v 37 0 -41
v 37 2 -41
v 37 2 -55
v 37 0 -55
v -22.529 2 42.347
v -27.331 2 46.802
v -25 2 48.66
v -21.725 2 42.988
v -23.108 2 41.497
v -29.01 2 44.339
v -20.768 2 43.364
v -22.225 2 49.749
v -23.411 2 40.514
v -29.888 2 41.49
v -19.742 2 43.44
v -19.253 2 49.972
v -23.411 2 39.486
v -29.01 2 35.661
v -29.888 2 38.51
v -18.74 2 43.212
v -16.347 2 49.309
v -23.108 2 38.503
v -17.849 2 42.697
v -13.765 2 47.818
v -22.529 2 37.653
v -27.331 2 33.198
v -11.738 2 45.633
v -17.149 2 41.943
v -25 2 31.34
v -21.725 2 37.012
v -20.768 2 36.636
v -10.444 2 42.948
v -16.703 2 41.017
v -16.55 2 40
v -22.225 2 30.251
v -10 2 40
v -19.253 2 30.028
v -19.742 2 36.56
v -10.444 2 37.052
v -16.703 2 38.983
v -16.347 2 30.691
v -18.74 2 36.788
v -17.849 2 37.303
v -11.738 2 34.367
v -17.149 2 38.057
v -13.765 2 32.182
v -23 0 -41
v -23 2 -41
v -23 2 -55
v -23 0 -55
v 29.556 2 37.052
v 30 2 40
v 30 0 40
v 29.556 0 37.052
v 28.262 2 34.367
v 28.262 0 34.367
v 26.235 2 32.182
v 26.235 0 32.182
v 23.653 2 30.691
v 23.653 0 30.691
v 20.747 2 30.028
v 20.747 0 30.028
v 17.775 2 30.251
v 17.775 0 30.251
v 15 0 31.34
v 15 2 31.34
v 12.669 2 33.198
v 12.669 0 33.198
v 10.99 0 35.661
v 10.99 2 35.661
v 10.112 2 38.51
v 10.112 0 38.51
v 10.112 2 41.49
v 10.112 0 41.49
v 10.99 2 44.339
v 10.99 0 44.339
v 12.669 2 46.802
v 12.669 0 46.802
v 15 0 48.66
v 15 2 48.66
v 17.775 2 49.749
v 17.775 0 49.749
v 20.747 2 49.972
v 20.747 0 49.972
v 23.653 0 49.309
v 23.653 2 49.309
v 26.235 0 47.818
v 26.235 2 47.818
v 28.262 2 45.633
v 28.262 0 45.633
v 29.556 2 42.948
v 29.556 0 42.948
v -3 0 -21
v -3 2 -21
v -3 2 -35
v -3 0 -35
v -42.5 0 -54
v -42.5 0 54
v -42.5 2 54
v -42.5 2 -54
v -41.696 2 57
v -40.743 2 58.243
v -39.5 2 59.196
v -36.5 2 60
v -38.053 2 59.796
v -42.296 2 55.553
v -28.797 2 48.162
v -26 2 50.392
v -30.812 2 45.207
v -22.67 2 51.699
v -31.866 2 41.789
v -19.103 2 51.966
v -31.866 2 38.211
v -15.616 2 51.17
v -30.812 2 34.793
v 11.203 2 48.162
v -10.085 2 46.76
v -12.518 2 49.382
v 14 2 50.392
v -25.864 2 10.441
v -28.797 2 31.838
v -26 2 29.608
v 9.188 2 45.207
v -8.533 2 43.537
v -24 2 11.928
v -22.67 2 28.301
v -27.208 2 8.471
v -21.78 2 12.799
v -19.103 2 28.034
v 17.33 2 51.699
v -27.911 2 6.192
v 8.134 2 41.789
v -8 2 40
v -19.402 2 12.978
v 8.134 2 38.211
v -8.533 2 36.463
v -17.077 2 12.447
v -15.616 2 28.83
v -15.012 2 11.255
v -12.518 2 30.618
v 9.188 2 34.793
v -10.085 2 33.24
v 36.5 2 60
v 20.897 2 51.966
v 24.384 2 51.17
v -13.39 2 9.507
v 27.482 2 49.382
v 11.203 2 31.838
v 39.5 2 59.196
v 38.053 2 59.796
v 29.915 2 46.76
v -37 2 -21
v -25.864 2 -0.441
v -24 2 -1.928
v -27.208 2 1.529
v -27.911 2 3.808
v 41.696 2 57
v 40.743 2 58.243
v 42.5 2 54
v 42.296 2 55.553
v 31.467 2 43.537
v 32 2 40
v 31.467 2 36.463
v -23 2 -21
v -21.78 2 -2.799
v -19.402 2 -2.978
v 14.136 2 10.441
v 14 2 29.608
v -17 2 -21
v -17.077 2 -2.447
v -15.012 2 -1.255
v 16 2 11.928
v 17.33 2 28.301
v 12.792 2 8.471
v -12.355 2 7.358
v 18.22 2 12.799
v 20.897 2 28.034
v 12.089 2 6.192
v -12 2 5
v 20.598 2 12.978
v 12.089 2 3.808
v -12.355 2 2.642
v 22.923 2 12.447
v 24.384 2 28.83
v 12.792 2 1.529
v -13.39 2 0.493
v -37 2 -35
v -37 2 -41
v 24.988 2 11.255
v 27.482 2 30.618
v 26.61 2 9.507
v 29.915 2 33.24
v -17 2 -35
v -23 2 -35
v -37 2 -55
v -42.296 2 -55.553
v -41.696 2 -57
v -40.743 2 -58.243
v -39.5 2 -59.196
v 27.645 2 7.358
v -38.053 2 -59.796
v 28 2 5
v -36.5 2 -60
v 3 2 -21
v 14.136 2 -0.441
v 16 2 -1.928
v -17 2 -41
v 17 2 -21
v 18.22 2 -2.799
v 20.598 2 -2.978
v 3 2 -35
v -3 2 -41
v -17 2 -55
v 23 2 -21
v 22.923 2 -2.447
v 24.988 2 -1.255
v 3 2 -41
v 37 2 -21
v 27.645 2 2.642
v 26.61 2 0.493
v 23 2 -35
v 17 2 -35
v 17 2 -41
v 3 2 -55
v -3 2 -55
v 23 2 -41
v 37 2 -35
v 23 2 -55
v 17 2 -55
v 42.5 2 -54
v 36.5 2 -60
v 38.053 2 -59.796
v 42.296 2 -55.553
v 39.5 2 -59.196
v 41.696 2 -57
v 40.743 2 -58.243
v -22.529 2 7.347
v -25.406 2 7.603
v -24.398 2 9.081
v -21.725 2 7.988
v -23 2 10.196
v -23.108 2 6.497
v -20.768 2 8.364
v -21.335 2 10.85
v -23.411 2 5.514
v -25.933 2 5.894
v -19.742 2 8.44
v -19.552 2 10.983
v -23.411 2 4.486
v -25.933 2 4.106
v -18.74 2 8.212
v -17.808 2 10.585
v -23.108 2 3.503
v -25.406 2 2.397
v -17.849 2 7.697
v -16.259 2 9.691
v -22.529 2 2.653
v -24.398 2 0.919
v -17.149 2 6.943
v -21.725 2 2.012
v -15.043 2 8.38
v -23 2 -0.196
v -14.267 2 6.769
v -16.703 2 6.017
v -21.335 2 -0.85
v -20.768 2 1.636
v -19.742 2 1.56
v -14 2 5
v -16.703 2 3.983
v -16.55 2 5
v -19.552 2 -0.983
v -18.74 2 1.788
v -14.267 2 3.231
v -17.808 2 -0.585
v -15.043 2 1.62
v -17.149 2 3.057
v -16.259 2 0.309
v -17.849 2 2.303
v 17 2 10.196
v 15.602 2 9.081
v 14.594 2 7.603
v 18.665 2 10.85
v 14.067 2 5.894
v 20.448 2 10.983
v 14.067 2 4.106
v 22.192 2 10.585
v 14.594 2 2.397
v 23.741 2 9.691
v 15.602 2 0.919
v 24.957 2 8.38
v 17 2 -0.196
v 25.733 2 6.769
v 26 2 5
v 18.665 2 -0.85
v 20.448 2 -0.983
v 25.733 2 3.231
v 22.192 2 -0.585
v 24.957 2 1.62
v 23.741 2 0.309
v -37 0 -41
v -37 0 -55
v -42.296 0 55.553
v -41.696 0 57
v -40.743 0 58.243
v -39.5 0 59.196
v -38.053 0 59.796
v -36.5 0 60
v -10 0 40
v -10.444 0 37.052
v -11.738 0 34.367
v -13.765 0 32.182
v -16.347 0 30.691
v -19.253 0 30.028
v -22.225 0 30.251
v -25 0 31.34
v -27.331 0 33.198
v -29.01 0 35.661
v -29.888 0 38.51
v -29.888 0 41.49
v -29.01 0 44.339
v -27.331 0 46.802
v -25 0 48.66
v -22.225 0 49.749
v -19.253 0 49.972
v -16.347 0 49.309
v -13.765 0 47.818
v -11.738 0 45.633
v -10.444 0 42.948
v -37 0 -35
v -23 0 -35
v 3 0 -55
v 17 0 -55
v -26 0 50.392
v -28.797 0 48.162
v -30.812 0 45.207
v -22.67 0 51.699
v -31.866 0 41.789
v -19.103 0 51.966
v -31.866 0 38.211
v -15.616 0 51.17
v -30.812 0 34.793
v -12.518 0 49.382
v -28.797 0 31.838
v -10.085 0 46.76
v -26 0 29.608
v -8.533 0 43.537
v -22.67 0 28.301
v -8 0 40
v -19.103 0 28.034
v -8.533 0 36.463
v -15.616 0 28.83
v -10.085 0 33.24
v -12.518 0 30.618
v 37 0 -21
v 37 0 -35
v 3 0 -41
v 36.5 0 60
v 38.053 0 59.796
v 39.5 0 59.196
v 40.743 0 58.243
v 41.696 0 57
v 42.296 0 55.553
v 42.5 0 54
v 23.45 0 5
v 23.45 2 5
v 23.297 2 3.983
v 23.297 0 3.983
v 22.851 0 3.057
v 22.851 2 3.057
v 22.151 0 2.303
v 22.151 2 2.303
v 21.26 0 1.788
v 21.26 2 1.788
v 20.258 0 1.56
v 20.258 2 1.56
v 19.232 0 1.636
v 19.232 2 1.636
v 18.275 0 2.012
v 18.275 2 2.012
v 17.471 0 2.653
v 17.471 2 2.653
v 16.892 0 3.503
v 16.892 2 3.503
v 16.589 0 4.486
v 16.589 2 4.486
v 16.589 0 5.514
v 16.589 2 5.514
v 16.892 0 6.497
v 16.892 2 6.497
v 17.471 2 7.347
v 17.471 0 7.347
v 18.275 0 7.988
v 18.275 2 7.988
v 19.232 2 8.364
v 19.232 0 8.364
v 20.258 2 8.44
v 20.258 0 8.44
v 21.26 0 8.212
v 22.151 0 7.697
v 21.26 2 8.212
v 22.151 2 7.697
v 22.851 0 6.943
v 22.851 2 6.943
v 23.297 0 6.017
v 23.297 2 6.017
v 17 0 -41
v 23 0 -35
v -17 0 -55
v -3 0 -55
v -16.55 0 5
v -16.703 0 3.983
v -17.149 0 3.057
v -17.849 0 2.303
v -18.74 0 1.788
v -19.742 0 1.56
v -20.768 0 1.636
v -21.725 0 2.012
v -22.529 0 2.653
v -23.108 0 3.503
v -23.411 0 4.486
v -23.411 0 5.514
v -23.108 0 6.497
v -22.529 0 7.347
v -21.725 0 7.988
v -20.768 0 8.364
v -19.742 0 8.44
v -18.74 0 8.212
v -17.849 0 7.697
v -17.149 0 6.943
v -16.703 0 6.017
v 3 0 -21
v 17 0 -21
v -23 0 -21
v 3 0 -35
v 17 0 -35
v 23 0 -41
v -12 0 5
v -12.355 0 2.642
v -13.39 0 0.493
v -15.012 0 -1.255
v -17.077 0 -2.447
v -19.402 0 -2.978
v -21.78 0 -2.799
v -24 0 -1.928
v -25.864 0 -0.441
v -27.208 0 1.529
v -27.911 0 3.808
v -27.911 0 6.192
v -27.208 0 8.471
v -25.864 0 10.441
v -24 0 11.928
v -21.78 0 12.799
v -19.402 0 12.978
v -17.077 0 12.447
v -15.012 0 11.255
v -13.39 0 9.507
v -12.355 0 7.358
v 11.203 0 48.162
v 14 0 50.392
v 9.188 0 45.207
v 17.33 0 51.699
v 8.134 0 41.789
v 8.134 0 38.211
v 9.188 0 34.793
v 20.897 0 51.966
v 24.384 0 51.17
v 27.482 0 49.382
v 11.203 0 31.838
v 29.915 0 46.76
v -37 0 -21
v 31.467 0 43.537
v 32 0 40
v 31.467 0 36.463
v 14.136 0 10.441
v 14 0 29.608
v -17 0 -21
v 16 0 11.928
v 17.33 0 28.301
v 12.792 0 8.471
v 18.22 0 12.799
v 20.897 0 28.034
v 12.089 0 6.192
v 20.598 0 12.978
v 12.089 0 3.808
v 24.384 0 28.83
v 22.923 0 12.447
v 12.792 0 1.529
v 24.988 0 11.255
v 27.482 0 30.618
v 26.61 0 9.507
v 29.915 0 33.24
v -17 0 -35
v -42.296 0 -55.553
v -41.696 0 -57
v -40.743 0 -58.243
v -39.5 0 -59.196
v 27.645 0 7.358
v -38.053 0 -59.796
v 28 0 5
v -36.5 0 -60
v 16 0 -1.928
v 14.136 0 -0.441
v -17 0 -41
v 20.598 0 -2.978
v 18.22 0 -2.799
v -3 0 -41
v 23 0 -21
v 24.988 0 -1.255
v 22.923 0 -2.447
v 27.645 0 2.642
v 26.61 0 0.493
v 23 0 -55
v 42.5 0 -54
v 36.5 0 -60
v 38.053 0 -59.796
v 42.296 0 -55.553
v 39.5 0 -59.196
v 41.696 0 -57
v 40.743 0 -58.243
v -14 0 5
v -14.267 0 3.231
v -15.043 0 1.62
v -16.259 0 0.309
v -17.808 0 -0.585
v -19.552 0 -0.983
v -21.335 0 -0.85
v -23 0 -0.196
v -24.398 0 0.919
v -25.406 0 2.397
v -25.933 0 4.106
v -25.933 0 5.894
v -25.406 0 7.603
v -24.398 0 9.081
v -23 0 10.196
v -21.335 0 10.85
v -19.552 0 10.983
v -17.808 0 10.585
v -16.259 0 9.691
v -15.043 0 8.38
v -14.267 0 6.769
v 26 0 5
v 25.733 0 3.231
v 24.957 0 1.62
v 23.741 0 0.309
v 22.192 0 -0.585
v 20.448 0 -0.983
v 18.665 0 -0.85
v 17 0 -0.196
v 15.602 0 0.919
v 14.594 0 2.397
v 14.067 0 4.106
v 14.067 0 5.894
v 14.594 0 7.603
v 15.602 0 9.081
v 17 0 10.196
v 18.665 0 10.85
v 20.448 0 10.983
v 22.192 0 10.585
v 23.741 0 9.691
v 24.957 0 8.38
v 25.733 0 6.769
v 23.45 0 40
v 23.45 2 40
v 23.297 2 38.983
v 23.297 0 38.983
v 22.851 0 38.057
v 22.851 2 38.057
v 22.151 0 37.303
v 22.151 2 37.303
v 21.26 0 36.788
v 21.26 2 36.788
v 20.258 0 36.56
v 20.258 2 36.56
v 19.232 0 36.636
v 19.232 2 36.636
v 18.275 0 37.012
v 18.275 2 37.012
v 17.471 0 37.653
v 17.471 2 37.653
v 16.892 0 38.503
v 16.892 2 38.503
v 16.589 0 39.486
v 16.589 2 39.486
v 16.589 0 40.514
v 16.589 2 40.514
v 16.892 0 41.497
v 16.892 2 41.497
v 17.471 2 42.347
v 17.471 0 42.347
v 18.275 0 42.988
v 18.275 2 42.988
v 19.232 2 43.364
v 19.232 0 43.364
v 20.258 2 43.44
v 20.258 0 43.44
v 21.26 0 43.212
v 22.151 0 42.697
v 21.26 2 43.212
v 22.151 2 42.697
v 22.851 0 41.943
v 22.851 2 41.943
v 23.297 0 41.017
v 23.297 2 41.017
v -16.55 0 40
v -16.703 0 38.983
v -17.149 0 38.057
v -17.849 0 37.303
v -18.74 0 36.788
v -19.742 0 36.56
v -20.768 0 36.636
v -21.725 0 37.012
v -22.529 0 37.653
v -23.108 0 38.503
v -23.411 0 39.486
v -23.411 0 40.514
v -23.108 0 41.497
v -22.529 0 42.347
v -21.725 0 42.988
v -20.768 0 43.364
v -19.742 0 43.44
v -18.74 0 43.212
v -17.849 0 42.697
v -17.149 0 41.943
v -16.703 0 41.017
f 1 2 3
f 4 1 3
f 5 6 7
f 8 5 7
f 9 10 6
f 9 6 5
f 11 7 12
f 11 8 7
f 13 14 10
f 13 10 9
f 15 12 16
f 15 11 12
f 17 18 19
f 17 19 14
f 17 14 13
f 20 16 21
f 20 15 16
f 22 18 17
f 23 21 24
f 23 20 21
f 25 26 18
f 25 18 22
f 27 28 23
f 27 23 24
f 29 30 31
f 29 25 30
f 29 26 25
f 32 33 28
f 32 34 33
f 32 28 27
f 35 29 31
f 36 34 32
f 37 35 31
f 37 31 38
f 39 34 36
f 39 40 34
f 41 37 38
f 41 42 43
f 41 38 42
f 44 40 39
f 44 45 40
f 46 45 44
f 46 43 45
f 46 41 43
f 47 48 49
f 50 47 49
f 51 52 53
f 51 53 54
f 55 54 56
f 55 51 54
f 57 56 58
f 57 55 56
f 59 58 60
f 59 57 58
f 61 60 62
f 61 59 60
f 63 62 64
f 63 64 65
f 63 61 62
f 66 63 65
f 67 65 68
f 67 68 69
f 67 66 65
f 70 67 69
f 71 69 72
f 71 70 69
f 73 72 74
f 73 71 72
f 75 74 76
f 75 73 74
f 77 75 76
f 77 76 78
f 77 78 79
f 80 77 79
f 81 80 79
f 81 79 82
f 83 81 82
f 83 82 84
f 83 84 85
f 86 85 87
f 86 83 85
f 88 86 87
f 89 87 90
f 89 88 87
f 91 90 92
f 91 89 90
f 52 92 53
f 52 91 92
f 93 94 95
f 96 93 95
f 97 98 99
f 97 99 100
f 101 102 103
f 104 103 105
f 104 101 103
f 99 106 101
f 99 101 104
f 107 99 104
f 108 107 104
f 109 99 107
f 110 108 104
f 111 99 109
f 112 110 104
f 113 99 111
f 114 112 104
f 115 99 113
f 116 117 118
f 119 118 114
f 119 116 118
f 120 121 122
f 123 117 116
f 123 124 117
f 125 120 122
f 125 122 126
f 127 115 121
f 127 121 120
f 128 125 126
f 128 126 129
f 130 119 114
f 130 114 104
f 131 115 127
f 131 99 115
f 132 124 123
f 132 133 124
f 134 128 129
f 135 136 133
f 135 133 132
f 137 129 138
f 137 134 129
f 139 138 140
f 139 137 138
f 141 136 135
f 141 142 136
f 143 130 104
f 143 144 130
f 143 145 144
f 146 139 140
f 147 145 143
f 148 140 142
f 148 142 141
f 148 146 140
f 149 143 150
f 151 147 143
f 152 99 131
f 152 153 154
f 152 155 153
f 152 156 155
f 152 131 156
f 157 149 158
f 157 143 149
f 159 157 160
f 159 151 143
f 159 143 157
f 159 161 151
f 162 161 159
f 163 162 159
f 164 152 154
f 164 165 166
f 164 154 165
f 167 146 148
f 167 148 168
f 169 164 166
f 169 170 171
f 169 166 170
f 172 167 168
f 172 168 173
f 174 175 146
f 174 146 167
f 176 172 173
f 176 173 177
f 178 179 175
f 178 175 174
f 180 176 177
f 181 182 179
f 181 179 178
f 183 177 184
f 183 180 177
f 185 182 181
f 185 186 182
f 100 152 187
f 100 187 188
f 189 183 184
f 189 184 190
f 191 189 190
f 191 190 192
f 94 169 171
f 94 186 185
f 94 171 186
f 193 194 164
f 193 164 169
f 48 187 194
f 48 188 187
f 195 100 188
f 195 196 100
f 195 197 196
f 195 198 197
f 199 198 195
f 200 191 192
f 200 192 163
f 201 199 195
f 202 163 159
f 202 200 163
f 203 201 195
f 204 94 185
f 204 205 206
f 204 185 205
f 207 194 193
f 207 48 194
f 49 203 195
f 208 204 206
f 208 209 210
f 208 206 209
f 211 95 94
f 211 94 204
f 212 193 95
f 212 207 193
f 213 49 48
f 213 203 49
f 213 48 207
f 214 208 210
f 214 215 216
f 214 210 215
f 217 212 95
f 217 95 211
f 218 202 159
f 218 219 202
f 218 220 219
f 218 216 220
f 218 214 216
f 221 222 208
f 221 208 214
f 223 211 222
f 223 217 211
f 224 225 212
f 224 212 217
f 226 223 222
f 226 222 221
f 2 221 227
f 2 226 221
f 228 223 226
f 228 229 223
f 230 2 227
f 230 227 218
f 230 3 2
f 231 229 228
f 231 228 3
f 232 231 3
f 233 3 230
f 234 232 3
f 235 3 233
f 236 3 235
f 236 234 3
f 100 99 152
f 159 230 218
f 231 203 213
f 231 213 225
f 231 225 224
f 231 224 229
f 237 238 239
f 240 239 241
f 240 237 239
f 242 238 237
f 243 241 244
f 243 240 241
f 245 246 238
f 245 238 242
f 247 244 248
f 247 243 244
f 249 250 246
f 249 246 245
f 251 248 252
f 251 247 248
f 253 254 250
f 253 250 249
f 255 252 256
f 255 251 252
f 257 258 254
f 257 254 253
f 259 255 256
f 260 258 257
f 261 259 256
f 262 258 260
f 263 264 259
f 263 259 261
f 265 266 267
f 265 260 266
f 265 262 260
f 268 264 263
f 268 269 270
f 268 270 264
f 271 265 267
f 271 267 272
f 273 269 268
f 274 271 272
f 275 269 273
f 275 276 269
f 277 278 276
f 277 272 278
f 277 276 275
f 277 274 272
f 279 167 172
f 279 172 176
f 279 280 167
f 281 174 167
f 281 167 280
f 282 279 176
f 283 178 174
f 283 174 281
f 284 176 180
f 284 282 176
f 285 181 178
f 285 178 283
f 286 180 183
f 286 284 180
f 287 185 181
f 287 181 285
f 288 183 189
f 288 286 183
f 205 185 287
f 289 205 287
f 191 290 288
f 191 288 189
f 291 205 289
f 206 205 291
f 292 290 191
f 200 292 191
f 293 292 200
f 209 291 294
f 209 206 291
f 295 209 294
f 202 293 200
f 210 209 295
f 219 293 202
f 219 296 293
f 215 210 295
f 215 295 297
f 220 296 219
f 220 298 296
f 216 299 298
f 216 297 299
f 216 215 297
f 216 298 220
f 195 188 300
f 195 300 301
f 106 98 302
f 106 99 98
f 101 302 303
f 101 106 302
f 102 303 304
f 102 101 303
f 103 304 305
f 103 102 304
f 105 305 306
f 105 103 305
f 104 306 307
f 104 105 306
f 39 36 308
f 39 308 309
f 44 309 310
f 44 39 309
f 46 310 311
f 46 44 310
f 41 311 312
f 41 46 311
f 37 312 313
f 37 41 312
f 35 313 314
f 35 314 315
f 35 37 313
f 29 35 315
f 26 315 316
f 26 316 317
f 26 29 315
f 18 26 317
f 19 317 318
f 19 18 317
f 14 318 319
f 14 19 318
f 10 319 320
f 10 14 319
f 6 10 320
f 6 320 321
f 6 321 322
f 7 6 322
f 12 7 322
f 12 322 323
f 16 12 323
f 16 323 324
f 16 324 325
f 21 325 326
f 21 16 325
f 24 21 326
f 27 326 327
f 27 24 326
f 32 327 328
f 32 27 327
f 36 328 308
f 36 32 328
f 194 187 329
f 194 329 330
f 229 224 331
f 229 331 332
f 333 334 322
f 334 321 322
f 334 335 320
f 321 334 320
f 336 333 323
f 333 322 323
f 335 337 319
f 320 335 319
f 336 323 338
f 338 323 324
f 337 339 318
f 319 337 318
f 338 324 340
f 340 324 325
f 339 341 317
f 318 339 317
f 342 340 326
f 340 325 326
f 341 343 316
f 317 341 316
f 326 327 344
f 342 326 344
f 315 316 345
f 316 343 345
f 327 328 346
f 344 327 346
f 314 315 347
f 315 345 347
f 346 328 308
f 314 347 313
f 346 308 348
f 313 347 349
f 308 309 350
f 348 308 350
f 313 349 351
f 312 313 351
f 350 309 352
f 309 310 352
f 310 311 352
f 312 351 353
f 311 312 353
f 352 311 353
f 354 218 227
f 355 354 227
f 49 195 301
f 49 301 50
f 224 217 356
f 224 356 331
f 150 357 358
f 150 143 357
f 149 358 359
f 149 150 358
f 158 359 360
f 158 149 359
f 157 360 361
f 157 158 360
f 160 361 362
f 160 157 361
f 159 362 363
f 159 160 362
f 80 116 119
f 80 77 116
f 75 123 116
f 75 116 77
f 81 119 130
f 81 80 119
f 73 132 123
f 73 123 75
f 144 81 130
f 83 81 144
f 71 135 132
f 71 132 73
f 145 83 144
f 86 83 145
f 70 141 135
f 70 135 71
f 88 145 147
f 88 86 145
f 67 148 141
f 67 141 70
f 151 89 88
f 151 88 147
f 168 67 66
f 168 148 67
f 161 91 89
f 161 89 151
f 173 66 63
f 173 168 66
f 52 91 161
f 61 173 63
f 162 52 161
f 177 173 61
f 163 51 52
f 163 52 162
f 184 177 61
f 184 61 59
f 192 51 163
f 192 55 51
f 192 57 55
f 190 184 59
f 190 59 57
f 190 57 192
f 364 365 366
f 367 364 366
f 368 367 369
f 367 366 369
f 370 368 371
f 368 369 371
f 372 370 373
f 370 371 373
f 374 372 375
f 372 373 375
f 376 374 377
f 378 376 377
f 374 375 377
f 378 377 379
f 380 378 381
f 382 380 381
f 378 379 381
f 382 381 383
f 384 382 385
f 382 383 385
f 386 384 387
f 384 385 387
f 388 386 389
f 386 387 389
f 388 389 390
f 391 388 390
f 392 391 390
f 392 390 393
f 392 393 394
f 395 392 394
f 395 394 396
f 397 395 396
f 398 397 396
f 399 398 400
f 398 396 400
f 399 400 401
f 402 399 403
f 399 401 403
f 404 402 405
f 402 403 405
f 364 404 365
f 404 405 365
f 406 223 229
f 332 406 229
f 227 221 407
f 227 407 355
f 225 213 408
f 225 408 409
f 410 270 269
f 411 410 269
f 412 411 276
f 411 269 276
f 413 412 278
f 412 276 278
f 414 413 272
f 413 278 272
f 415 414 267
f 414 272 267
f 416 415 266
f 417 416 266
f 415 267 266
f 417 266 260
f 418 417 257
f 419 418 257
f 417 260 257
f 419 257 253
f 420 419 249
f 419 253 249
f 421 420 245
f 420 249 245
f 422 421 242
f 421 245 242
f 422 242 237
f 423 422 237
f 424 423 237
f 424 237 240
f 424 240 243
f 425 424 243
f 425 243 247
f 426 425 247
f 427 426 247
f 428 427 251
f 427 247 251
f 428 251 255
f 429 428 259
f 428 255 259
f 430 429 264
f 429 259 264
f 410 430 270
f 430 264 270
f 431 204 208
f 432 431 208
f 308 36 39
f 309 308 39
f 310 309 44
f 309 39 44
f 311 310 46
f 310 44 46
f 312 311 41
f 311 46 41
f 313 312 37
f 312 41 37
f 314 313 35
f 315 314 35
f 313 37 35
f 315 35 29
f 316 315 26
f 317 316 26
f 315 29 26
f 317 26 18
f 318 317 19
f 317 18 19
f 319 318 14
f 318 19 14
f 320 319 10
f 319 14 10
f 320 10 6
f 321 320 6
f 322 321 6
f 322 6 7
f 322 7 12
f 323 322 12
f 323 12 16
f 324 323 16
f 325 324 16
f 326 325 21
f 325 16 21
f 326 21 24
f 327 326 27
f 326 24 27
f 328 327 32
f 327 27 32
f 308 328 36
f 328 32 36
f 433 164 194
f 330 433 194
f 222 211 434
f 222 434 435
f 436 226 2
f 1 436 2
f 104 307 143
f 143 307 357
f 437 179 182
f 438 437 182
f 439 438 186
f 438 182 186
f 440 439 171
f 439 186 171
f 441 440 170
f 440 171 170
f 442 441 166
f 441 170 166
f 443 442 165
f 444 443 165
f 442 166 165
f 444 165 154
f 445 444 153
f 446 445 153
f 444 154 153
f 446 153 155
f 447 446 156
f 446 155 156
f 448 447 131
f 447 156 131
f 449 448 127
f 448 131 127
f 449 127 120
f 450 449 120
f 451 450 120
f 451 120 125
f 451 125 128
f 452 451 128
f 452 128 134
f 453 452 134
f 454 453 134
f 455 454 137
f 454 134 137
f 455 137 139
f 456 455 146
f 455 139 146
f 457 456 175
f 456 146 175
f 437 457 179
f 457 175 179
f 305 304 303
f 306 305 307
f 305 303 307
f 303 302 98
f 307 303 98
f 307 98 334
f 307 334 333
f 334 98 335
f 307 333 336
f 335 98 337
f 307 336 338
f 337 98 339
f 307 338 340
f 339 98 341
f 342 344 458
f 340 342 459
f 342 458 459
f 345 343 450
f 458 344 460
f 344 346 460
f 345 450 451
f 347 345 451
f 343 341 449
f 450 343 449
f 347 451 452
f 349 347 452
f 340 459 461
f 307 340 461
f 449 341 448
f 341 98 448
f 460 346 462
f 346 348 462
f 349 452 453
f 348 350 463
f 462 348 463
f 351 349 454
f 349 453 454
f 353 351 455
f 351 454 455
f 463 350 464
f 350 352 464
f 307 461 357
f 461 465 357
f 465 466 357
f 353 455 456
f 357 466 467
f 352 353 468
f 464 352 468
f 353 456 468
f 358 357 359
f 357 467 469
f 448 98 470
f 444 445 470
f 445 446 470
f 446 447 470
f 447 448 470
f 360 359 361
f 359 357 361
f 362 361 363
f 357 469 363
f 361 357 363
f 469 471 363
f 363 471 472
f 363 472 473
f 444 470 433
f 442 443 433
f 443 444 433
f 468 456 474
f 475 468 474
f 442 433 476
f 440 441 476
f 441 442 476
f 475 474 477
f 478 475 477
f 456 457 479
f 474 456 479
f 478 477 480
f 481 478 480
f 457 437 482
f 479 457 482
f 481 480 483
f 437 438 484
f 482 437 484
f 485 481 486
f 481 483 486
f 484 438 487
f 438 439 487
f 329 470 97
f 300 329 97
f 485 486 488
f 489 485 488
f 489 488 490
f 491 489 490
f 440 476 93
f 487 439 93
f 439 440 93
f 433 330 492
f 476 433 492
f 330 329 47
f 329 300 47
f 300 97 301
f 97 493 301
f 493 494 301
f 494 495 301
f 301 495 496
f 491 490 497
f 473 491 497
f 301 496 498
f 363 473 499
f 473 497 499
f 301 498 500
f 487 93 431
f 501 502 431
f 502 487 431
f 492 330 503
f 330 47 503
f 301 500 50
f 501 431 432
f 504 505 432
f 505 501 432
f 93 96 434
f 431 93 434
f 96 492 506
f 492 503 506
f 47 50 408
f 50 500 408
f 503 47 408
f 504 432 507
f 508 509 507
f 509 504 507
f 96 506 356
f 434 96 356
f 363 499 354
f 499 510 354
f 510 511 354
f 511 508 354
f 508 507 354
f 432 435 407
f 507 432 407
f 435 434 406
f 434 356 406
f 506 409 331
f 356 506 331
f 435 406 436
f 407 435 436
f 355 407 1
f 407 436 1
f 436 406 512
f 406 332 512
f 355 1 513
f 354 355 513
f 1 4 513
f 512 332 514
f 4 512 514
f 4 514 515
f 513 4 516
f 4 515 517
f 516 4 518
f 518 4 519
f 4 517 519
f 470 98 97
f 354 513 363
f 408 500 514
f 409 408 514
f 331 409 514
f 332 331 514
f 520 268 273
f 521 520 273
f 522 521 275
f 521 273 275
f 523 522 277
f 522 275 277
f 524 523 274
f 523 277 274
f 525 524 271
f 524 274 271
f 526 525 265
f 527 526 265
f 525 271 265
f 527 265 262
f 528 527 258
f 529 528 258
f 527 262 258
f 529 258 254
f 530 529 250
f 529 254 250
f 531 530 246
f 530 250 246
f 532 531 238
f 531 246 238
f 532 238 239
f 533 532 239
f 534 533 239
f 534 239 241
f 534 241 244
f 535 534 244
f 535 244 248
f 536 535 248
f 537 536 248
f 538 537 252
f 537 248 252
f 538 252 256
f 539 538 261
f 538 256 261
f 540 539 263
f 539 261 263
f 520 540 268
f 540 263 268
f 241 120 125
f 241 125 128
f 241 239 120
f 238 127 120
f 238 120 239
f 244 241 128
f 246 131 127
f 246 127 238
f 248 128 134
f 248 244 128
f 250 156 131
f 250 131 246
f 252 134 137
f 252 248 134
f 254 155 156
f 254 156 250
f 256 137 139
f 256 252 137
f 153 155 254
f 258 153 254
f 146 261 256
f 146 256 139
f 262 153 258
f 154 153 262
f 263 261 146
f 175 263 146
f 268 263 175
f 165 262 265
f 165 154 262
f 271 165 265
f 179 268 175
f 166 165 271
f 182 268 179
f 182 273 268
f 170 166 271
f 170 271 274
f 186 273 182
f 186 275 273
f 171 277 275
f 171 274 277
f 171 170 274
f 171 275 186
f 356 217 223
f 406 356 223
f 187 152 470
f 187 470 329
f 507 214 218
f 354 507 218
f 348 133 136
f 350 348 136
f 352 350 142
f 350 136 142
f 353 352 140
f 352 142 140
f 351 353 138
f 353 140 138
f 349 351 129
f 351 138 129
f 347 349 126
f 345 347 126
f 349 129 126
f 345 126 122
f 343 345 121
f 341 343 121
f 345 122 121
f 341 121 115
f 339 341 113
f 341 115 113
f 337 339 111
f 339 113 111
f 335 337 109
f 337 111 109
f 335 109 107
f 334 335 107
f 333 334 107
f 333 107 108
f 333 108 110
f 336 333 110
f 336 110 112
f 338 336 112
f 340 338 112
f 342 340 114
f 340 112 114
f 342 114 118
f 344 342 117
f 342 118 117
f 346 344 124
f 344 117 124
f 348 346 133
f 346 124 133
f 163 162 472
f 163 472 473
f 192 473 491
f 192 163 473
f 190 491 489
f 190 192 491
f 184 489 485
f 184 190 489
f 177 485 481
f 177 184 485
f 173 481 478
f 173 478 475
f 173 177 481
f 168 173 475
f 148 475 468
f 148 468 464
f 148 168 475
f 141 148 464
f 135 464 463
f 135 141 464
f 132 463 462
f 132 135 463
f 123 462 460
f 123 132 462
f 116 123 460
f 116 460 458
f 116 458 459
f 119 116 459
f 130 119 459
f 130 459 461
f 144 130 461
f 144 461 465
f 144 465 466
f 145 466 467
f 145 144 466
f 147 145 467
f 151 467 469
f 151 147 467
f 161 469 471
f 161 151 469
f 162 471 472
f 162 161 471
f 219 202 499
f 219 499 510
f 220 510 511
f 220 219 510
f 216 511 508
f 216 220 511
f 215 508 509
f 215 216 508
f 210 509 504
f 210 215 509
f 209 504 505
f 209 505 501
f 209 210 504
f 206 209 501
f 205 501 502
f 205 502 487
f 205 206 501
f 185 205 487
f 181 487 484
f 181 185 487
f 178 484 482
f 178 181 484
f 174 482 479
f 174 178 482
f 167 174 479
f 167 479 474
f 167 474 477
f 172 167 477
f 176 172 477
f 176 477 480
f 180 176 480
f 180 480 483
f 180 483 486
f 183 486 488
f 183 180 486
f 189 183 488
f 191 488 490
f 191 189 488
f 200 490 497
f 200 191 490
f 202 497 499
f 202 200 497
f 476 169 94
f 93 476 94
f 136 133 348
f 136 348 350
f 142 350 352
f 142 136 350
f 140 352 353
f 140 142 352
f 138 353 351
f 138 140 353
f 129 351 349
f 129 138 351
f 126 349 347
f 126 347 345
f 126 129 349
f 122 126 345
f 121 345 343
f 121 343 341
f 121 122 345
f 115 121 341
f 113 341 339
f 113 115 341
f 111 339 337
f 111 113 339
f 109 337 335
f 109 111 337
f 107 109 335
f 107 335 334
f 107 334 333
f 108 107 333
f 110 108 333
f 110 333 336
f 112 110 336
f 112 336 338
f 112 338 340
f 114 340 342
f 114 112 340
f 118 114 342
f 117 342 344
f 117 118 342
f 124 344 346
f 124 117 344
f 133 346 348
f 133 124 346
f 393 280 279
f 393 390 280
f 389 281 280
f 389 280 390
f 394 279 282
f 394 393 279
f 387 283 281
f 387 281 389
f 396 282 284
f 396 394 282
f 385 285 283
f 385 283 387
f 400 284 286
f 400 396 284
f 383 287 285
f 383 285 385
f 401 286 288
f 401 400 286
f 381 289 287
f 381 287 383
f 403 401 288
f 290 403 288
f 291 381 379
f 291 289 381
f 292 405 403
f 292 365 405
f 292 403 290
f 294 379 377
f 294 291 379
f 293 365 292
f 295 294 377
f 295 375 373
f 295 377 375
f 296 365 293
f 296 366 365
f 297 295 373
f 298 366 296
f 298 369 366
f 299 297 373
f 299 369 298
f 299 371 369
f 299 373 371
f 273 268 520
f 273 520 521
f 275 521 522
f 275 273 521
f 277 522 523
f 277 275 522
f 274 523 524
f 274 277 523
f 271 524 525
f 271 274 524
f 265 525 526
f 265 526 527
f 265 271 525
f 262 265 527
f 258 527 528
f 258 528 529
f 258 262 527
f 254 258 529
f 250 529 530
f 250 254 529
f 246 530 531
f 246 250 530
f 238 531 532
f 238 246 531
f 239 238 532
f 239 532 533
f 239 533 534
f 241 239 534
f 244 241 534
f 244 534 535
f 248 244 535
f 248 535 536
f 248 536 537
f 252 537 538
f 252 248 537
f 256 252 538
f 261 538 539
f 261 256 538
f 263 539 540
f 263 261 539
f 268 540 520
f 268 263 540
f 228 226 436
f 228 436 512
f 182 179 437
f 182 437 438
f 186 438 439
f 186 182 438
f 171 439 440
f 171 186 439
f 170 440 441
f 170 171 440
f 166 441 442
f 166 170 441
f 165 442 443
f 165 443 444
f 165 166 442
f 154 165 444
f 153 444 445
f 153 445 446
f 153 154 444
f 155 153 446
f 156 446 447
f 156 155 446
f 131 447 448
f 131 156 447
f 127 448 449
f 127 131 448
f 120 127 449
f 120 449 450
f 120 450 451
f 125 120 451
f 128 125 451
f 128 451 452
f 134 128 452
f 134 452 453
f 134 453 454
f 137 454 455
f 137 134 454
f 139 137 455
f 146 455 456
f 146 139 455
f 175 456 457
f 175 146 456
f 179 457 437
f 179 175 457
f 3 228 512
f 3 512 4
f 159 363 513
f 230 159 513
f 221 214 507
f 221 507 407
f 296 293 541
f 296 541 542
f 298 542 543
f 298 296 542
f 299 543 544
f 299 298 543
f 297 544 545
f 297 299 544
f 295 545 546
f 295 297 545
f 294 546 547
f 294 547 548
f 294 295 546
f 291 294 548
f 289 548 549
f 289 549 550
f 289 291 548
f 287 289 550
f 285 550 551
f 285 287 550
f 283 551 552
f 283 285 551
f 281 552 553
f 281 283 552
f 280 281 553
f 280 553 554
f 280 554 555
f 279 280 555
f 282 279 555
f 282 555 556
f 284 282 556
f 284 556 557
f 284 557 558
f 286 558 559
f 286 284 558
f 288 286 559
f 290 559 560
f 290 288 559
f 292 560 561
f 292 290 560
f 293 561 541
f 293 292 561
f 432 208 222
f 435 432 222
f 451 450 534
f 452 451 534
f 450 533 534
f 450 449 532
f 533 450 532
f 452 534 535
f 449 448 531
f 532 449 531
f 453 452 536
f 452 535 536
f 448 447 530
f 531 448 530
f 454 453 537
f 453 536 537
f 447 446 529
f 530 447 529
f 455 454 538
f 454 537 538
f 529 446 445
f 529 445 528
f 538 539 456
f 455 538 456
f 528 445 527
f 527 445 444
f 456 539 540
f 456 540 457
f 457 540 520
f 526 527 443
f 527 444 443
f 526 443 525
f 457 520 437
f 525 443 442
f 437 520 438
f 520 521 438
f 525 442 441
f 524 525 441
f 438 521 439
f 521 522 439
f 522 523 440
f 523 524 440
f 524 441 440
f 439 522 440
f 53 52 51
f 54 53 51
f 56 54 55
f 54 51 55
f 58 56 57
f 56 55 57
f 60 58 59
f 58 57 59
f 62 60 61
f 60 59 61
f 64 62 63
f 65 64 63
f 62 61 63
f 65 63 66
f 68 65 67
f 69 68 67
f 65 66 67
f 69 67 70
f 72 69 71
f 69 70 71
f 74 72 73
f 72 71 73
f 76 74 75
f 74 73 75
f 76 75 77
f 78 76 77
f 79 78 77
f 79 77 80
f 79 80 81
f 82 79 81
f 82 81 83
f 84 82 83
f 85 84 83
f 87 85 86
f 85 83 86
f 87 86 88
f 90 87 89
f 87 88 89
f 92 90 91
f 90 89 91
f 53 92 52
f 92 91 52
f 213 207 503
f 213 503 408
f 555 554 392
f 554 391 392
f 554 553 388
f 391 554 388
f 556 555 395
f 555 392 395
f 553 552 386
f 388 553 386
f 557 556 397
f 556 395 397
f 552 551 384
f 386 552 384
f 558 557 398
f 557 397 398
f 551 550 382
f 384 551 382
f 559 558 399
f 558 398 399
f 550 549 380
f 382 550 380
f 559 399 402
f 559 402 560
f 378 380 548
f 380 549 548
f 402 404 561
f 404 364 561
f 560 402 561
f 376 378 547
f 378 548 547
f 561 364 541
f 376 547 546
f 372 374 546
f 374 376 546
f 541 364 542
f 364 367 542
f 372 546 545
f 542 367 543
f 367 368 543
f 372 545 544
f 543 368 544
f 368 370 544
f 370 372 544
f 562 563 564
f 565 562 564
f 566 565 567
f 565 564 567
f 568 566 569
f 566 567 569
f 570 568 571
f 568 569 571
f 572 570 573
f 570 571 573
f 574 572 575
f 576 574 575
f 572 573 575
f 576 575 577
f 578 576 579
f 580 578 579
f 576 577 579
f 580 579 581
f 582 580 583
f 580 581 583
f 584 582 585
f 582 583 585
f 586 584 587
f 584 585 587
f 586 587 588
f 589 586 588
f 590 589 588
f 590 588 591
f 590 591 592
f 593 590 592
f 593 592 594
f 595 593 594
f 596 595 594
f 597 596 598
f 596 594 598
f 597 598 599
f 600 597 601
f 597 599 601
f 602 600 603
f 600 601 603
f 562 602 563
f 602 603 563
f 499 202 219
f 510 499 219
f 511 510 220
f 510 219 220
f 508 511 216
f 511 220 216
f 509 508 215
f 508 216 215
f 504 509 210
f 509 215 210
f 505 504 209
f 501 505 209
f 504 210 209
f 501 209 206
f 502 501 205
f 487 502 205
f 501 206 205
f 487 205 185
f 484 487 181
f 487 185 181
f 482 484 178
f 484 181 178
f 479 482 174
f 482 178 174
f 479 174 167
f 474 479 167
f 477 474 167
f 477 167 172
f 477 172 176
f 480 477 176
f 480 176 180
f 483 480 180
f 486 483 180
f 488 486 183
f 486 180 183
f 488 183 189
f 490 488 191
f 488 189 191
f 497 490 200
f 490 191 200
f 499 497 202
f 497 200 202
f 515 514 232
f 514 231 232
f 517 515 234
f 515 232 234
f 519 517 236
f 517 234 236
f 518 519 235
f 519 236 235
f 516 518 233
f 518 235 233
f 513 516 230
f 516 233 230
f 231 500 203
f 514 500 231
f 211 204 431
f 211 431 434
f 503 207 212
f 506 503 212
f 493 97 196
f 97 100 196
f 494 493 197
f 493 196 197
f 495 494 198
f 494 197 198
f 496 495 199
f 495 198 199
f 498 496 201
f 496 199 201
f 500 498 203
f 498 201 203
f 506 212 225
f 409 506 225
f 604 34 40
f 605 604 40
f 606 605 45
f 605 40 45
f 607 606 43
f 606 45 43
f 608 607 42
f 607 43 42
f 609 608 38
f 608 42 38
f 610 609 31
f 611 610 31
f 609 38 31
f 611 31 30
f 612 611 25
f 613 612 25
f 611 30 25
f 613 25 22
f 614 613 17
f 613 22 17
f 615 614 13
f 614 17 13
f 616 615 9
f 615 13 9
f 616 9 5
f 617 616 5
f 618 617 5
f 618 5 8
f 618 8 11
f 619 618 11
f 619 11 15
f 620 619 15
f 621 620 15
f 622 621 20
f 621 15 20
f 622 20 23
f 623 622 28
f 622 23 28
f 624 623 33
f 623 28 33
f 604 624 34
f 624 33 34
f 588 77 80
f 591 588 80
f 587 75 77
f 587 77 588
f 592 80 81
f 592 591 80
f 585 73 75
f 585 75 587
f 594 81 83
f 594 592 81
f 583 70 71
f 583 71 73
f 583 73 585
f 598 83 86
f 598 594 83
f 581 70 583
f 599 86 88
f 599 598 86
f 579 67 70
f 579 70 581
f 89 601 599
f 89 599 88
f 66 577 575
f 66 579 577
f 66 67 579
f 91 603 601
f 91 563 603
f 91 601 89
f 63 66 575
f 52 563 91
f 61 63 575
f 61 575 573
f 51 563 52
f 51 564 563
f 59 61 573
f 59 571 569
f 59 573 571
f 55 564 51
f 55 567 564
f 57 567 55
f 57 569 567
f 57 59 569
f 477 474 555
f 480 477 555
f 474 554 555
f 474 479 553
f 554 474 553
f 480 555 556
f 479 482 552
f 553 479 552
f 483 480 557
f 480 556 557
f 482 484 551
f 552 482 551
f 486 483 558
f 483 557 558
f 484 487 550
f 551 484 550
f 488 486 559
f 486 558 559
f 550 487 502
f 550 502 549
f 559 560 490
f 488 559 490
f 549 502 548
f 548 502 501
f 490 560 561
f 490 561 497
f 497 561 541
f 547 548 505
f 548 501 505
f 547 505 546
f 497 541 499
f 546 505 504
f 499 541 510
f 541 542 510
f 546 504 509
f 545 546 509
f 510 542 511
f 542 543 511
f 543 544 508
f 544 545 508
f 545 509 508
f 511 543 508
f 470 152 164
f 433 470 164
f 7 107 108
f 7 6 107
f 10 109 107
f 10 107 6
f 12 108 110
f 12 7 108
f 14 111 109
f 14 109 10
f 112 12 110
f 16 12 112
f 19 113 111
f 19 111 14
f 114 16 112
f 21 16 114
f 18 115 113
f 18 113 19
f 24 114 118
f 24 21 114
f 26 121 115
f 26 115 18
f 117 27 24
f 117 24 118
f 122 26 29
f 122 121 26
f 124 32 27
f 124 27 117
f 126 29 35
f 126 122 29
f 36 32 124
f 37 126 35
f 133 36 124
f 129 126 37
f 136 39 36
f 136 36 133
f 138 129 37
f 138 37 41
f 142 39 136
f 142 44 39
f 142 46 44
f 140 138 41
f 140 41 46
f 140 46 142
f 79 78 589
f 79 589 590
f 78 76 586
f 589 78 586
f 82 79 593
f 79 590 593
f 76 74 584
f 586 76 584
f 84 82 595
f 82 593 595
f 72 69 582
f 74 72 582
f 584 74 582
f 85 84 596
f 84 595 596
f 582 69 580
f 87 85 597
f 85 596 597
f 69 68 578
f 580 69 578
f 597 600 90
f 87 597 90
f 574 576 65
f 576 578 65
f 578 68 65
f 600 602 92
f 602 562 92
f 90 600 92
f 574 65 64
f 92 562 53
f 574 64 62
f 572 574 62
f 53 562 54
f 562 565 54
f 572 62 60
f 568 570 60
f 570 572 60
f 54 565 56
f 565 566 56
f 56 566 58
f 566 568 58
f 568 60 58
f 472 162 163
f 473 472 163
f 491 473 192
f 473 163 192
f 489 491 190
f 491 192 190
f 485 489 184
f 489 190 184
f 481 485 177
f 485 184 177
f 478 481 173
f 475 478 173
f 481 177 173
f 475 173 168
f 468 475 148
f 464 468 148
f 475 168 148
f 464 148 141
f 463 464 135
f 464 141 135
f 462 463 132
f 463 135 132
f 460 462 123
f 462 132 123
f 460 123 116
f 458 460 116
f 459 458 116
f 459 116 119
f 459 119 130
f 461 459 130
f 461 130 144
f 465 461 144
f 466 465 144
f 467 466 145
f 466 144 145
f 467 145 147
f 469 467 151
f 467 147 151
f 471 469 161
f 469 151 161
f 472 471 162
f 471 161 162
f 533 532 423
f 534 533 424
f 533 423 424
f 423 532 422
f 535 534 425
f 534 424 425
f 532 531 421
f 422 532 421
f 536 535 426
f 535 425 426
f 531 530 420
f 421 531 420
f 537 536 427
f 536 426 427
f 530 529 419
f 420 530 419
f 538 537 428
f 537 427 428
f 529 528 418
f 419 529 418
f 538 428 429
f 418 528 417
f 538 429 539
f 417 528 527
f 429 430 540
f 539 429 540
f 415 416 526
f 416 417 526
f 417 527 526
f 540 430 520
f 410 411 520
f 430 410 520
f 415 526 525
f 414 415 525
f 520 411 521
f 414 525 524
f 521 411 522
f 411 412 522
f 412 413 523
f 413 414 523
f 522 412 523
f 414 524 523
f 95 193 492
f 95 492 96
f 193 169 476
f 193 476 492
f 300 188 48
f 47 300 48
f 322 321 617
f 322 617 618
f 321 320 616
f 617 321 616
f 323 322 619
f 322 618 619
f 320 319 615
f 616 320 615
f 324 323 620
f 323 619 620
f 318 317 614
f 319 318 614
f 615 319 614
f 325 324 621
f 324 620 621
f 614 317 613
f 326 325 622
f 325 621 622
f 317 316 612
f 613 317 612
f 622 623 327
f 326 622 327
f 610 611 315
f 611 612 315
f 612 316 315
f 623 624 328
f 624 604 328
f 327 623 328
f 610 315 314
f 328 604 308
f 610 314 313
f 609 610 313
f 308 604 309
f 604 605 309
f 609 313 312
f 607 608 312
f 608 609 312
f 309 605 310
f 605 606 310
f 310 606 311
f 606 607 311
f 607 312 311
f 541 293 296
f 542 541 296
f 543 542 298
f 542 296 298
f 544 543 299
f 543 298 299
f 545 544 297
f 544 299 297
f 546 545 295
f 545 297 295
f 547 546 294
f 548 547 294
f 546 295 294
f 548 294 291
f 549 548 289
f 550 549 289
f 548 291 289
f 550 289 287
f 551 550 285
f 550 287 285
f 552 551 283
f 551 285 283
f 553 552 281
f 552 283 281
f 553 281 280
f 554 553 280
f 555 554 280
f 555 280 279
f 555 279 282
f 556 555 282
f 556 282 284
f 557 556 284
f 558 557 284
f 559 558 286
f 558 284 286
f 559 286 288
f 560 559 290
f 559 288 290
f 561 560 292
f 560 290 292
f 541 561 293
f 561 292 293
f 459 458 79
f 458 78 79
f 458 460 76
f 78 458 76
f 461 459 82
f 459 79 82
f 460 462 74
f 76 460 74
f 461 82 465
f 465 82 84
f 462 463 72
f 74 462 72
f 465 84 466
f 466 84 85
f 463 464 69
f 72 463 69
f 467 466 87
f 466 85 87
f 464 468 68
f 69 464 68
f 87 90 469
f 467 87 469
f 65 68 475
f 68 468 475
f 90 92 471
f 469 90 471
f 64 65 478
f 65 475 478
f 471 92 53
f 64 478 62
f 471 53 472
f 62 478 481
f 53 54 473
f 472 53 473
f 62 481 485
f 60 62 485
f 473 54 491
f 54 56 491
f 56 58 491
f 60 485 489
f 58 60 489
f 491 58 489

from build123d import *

# Parameters (mm, degrees)
ESQUISSE1_W             = 85
ESQUISSE1_H             = 120
BOSS_EXTRU_1_DEPTH      = 2
ESQUISSE2_W             = 14
ESQUISSE2_H             = 14
ENL_V_MAT_EXTRU_1_DEPTH = 2
ESQUISSE3_R             = 8
ESQUISSE3_R_2           = 12
ENL_V_MAT_EXTRU_2_DEPTH = 2
CONG_1_R                = 6
ESQUISSE4_R             = 8
ESQUISSE4_R_2           = 6
BOSS_EXTRU_2_DEPTH      = 2
ESQUISSE4_R_3           = 12
ESQUISSE4_R_4           = 10
BOSS_EXTRU_2_2_DEPTH    = 2
BOSS_EXTRU_2_3_DEPTH    = 2
BOSS_EXTRU_2_4_DEPTH    = 2
ESQUISSE5_R             = 10
ESQUISSE5_R_2           = 3.45
BOSS_EXTRU_4_DEPTH      = 2
BOSS_EXTRU_4_2_DEPTH    = 2
ESQUISSE5_R_3           = 6
BOSS_EXTRU_4_3_DEPTH    = 2
BOSS_EXTRU_4_4_DEPTH    = 2


with BuildPart() as part:
    # Esquisse1 → Boss.-Extru.1 (new body)
    with BuildSketch(Plane(origin=(0, 0, 0), x_dir=(1, 0, 0), z_dir=(0, 1, 0))):
        Rectangle(ESQUISSE1_W, ESQUISSE1_H)
    extrude(amount=BOSS_EXTRU_1_DEPTH)

    # Esquisse2 → Enlèv. mat.-Extru.1 (cut)
    with BuildSketch(Plane(origin=(0, 2, 0), x_dir=(1, 0, 0), z_dir=(0, 1, 0))):
        with Locations((-30, 48)):
            Rectangle(ESQUISSE2_W, ESQUISSE2_H)
        with Locations((-10, 48)):
            Rectangle(ESQUISSE2_W, ESQUISSE2_H)
        with Locations((10, 48)):
            Rectangle(ESQUISSE2_W, ESQUISSE2_H)
        with Locations((30, 48)):
            Rectangle(ESQUISSE2_W, ESQUISSE2_H)
        with Locations((30, 28)):
            Rectangle(ESQUISSE2_W, ESQUISSE2_H)
        with Locations((10, 28)):
            Rectangle(ESQUISSE2_W, ESQUISSE2_H)
        with Locations((-10, 28)):
            Rectangle(ESQUISSE2_W, ESQUISSE2_H)
        with Locations((-30, 28)):
            Rectangle(ESQUISSE2_W, ESQUISSE2_H)
    extrude(amount=-ENL_V_MAT_EXTRU_1_DEPTH, mode=Mode.SUBTRACT)

    # Esquisse3 → Enlèv. mat.-Extru.2 (cut)
    with BuildSketch(Plane(origin=(0, 2, 0), x_dir=(1, 0, 0), z_dir=(0, 1, 0))):
        with Locations((-20, -5)):
            Circle(ESQUISSE3_R)
        with Locations((-20, -40)):
            Circle(ESQUISSE3_R_2)
        with Locations((20, -5)):
            Circle(ESQUISSE3_R)
        with Locations((20, -40)):
            Circle(ESQUISSE3_R_2)
    extrude(amount=-ENL_V_MAT_EXTRU_2_DEPTH, mode=Mode.SUBTRACT)

    # Congé1
    cong_1_edges = [part.edges().sort_by_distance(p)[0] for p in [
        (42.5, 1, 60),
        (-42.5, 1, 60),
        (-42.5, 1, -60),
        (42.5, 1, -60),
    ]]
    fillet(cong_1_edges, radius=CONG_1_R)


with BuildPart() as body_2:
    # Esquisse4 → Boss.-Extru.2 (new body)
    with BuildSketch(Plane(origin=(0, 2, 0), x_dir=(1, 0, 0), z_dir=(0, 1, 0))):
        with Locations((-20, -5)):
            Circle(ESQUISSE4_R)
        with Locations((-20, -5)):
            Circle(ESQUISSE4_R_2, mode=Mode.SUBTRACT)
    extrude(amount=-BOSS_EXTRU_2_DEPTH)


with BuildPart() as body_3:
    # Esquisse4 → Boss.-Extru.2 2 (new body)
    with BuildSketch(Plane(origin=(0, 2, 0), x_dir=(1, 0, 0), z_dir=(0, 1, 0))):
        with Locations((-20, -40)):
            Circle(ESQUISSE4_R_3)
        with Locations((-20, -40)):
            Circle(ESQUISSE4_R_4, mode=Mode.SUBTRACT)
    extrude(amount=-BOSS_EXTRU_2_2_DEPTH)


with BuildPart() as body_4:
    # Esquisse4 → Boss.-Extru.2 3 (new body)
    with BuildSketch(Plane(origin=(0, 2, 0), x_dir=(1, 0, 0), z_dir=(0, 1, 0))):
        with Locations((20, -40)):
            Circle(ESQUISSE4_R_3)
        with Locations((20, -40)):
            Circle(ESQUISSE4_R_4, mode=Mode.SUBTRACT)
    extrude(amount=-BOSS_EXTRU_2_3_DEPTH)


with BuildPart() as body_5:
    # Esquisse4 → Boss.-Extru.2 4 (new body)
    with BuildSketch(Plane(origin=(0, 2, 0), x_dir=(1, 0, 0), z_dir=(0, 1, 0))):
        with Locations((20, -5)):
            Circle(ESQUISSE4_R)
        with Locations((20, -5)):
            Circle(ESQUISSE4_R_2, mode=Mode.SUBTRACT)
    extrude(amount=-BOSS_EXTRU_2_4_DEPTH)


with BuildPart() as body_6:
    # Esquisse5 → Boss.-Extru.4 (new body)
    with BuildSketch(Plane(origin=(0, 2, 0), x_dir=(1, 0, 0), z_dir=(0, 1, 0))):
        with Locations((-20, -40)):
            Circle(ESQUISSE5_R)
        with Locations((-20, -40)):
            Circle(ESQUISSE5_R_2, mode=Mode.SUBTRACT)
    extrude(amount=-BOSS_EXTRU_4_DEPTH)


with BuildPart() as body_7:
    # Esquisse5 → Boss.-Extru.4 2 (new body)
    with BuildSketch(Plane(origin=(0, 2, 0), x_dir=(1, 0, 0), z_dir=(0, 1, 0))):
        with Locations((20, -40)):
            Circle(ESQUISSE5_R)
        with Locations((20, -40)):
            Circle(ESQUISSE5_R_2, mode=Mode.SUBTRACT)
    extrude(amount=-BOSS_EXTRU_4_2_DEPTH)


with BuildPart() as body_8:
    # Esquisse5 → Boss.-Extru.4 3 (new body)
    with BuildSketch(Plane(origin=(0, 2, 0), x_dir=(1, 0, 0), z_dir=(0, 1, 0))):
        with Locations((20, -5)):
            Circle(ESQUISSE5_R_3)
        with Locations((20, -5)):
            Circle(ESQUISSE5_R_2, mode=Mode.SUBTRACT)
    extrude(amount=-BOSS_EXTRU_4_3_DEPTH)


with BuildPart() as body_9:
    # Esquisse5 → Boss.-Extru.4 4 (new body)
    with BuildSketch(Plane(origin=(0, 2, 0), x_dir=(1, 0, 0), z_dir=(0, 1, 0))):
        with Locations((-20, -5)):
            Circle(ESQUISSE5_R_3)
        with Locations((-20, -5)):
            Circle(ESQUISSE5_R_2, mode=Mode.SUBTRACT)
    extrude(amount=-BOSS_EXTRU_4_4_DEPTH)


solid = Compound([part.part, body_2.part, body_3.part, body_4.part, body_5.part, body_6.part, body_7.part, body_8.part, body_9.part])
